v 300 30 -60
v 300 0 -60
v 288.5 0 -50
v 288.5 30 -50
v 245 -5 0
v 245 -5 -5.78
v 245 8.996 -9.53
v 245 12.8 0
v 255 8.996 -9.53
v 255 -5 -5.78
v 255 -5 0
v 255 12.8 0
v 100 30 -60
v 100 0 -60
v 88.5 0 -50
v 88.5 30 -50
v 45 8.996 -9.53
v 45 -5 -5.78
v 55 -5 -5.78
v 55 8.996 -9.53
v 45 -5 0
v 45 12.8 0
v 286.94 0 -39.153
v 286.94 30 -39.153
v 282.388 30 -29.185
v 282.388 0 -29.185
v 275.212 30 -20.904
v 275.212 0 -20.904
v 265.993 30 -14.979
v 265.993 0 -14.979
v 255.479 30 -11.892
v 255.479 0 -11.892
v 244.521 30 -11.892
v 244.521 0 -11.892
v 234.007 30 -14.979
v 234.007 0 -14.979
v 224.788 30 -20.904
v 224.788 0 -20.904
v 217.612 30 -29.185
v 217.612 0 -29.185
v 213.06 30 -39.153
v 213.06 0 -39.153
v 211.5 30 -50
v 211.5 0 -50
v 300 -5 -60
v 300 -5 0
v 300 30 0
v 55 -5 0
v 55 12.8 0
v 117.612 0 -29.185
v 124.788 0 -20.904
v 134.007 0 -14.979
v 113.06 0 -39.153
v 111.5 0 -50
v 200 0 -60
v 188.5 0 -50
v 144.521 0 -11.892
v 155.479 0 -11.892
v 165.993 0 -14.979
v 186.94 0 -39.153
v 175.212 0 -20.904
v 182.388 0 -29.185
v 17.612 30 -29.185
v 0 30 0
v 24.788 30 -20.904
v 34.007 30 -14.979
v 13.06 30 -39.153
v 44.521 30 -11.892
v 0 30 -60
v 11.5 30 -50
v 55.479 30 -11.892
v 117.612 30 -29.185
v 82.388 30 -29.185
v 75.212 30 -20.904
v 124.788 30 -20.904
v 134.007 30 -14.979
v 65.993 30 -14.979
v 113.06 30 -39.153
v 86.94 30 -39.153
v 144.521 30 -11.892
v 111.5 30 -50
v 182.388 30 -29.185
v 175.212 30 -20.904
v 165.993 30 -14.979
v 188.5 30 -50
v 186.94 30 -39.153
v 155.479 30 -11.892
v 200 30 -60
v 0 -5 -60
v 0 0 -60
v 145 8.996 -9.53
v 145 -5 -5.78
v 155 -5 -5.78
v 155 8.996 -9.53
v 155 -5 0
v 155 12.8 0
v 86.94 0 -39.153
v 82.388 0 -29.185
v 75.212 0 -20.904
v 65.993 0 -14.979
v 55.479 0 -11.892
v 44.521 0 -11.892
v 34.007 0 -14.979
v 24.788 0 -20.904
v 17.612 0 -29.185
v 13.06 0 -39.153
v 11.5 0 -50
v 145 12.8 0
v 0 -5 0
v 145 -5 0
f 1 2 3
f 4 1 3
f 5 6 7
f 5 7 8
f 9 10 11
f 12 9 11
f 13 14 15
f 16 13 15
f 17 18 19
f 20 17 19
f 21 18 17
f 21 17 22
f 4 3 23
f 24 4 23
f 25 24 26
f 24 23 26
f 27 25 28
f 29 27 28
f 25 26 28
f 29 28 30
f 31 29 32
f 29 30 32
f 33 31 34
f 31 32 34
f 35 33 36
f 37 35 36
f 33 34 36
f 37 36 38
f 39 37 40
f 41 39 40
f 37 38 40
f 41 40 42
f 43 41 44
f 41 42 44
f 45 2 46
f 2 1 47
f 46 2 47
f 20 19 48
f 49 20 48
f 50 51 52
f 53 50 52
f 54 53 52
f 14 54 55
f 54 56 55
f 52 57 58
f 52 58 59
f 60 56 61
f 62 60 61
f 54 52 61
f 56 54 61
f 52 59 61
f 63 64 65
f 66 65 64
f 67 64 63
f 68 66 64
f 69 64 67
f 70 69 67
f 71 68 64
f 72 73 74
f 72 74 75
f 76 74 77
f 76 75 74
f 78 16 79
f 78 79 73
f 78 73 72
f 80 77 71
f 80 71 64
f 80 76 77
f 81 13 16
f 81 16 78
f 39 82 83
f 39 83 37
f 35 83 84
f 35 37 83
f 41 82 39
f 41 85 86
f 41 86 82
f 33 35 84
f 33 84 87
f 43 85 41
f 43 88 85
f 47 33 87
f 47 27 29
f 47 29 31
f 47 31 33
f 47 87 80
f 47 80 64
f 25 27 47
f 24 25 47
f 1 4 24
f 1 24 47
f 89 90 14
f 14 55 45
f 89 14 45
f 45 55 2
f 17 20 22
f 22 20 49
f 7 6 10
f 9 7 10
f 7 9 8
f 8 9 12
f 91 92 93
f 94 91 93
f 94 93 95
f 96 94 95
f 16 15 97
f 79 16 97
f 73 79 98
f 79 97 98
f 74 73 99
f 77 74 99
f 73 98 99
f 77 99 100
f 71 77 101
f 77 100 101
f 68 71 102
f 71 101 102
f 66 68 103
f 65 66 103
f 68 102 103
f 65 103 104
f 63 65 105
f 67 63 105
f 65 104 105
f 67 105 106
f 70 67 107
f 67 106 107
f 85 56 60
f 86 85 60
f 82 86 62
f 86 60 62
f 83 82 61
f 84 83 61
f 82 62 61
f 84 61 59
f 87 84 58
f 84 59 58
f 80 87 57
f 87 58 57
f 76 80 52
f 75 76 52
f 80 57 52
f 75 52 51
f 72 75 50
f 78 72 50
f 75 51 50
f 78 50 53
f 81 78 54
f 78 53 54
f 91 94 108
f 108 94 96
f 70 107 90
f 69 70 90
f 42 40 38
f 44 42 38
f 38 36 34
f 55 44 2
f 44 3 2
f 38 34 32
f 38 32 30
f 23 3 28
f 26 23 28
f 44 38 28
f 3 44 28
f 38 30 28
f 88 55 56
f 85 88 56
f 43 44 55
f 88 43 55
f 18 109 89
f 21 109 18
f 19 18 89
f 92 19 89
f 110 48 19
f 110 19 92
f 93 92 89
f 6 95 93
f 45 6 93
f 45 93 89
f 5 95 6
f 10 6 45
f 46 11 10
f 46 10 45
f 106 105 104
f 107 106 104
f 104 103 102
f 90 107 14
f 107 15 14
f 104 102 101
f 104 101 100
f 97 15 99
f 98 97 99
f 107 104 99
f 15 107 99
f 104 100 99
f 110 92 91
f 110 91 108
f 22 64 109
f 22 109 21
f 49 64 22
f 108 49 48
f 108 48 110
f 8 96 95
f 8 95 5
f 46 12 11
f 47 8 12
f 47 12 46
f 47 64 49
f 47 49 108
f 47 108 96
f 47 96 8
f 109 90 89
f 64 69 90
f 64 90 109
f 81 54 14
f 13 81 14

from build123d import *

# Parameters (mm, degrees)
BOSS_EXTRU_1_DEPTH         = 30
ESQUISSE2_W                = 300
ESQUISSE2_H                = 60
BOSS_EXTRU_2_DEPTH         = 5
ESQUISSE3_W                = 10
ESQUISSE3_H                = 5.78
ENL_V_MAT_EXTRU_3_DEPTH    = 14.49
ESQUISSE5_W                = 10
ESQUISSE5_H                = 17.8
ENL_V_MAT_EXTRU_5_DEPTH    = 5
BOSS_EXTRU_4_REACH         = 256.018
ENL_V_MAT_EXTRU_6_DEPTH    = 10
R_P_TITION_LIN_AIRE1_COUNT = 3
R_P_TITION_LIN_AIRE1_PITCH = 100


with BuildPart() as part:
    # Esquisse1 → Boss.-Extru.1 (new body)
    with BuildSketch(Plane(origin=(0, 0, 0), x_dir=(1, 0, 0), z_dir=(0, 1, 0))):
        with BuildLine():
            Line((0, 0), (300, 0))
            Line((300, 0), (300, 60))
            Line((300, 60), (288.5, 50))
            ThreePointArc((288.5, 50), (250, 11.5), (211.5, 50))
            Line((211.5, 50), (200, 60))
            Line((200, 60), (188.5, 50))
            ThreePointArc((188.5, 50), (150, 11.5), (111.5, 50))
            Line((111.5, 50), (100, 60))
            Line((100, 60), (88.5, 50))
            ThreePointArc((88.5, 50), (50, 11.5), (11.5, 50))
            Line((11.5, 50), (0, 60))
            Line((0, 60), (0, 0))
        make_face()
    extrude(amount=BOSS_EXTRU_1_DEPTH)

    # Esquisse2 → Boss.-Extru.2 (add)
    with BuildSketch(Plane.XZ):
        with Locations((150, -30)):
            Rectangle(ESQUISSE2_W, ESQUISSE2_H)
    extrude(amount=BOSS_EXTRU_2_DEPTH)

    # Esquisse3 → Enlèv. mat.-Extru.3 (cut, along a direction that is not the sketch's normal)
    with BuildSketch(Plane.XZ.offset(5)):
        with Locations((50, -2.89)):
            Rectangle(ESQUISSE3_W, ESQUISSE3_H)
        with Locations((250, -2.89)):
            Rectangle(ESQUISSE3_W, ESQUISSE3_H)
        with Locations((150, -2.89)):
            Rectangle(ESQUISSE3_W, ESQUISSE3_H)
    extrude(amount=-ENL_V_MAT_EXTRU_3_DEPTH, dir=(0, -0.96592582628907, 0.2588190451025146), mode=Mode.SUBTRACT)

    # Esquisse5 → Enlèv. mat.-Extru.5 (cut)
    with BuildSketch(Plane.XY):
        with Locations((250, 3.9)):
            Rectangle(ESQUISSE5_W, ESQUISSE5_H)
        with Locations((150, 3.9)):
            Rectangle(ESQUISSE5_W, ESQUISSE5_H)
        with Locations((50, 3.9)):
            Rectangle(ESQUISSE5_W, ESQUISSE5_H)
    extrude(amount=-ENL_V_MAT_EXTRU_5_DEPTH, mode=Mode.SUBTRACT)

    # Esquisse7 → Boss.-Extru.4 (add, up to next)
    with BuildSketch(Plane.ZY.offset(-55), mode=Mode.PRIVATE) as boss_extru_4_sk1:
        Polygon((-9.530287964, 8.996265223), (0, 12.8), (-9.530287964, 12.8), align=None)
    boss_extru_4_tool1 = extrude(boss_extru_4_sk1.sketch, amount=BOSS_EXTRU_4_REACH, mode=Mode.PRIVATE) - part.part
    boss_extru_4 = boss_extru_4_tool1.solids().sort_by_distance((55, 11.532088, -6.353525))[0]
    add(boss_extru_4)

    # Esquisse8 → Enlèv. mat.-Extru.6 (cut)
    with BuildSketch(Plane.ZY.offset(-55)):
        Polygon((-9.530287964, 8.996265223), (0, 12.8), (0, -5), (-5.78, -5), align=None)
    enl_v_mat_extru_6 = extrude(amount=ENL_V_MAT_EXTRU_6_DEPTH, mode=Mode.SUBTRACT)

    # Répétition linéaire1: Boss.-Extru.4, Enlèv. mat.-Extru.6 ×3
    with Locations(*[(i * R_P_TITION_LIN_AIRE1_PITCH, 0, 0) for i in range(1, R_P_TITION_LIN_AIRE1_COUNT)]):
        add(boss_extru_4)
        add(enl_v_mat_extru_6, mode=Mode.SUBTRACT)


solid = part.part
